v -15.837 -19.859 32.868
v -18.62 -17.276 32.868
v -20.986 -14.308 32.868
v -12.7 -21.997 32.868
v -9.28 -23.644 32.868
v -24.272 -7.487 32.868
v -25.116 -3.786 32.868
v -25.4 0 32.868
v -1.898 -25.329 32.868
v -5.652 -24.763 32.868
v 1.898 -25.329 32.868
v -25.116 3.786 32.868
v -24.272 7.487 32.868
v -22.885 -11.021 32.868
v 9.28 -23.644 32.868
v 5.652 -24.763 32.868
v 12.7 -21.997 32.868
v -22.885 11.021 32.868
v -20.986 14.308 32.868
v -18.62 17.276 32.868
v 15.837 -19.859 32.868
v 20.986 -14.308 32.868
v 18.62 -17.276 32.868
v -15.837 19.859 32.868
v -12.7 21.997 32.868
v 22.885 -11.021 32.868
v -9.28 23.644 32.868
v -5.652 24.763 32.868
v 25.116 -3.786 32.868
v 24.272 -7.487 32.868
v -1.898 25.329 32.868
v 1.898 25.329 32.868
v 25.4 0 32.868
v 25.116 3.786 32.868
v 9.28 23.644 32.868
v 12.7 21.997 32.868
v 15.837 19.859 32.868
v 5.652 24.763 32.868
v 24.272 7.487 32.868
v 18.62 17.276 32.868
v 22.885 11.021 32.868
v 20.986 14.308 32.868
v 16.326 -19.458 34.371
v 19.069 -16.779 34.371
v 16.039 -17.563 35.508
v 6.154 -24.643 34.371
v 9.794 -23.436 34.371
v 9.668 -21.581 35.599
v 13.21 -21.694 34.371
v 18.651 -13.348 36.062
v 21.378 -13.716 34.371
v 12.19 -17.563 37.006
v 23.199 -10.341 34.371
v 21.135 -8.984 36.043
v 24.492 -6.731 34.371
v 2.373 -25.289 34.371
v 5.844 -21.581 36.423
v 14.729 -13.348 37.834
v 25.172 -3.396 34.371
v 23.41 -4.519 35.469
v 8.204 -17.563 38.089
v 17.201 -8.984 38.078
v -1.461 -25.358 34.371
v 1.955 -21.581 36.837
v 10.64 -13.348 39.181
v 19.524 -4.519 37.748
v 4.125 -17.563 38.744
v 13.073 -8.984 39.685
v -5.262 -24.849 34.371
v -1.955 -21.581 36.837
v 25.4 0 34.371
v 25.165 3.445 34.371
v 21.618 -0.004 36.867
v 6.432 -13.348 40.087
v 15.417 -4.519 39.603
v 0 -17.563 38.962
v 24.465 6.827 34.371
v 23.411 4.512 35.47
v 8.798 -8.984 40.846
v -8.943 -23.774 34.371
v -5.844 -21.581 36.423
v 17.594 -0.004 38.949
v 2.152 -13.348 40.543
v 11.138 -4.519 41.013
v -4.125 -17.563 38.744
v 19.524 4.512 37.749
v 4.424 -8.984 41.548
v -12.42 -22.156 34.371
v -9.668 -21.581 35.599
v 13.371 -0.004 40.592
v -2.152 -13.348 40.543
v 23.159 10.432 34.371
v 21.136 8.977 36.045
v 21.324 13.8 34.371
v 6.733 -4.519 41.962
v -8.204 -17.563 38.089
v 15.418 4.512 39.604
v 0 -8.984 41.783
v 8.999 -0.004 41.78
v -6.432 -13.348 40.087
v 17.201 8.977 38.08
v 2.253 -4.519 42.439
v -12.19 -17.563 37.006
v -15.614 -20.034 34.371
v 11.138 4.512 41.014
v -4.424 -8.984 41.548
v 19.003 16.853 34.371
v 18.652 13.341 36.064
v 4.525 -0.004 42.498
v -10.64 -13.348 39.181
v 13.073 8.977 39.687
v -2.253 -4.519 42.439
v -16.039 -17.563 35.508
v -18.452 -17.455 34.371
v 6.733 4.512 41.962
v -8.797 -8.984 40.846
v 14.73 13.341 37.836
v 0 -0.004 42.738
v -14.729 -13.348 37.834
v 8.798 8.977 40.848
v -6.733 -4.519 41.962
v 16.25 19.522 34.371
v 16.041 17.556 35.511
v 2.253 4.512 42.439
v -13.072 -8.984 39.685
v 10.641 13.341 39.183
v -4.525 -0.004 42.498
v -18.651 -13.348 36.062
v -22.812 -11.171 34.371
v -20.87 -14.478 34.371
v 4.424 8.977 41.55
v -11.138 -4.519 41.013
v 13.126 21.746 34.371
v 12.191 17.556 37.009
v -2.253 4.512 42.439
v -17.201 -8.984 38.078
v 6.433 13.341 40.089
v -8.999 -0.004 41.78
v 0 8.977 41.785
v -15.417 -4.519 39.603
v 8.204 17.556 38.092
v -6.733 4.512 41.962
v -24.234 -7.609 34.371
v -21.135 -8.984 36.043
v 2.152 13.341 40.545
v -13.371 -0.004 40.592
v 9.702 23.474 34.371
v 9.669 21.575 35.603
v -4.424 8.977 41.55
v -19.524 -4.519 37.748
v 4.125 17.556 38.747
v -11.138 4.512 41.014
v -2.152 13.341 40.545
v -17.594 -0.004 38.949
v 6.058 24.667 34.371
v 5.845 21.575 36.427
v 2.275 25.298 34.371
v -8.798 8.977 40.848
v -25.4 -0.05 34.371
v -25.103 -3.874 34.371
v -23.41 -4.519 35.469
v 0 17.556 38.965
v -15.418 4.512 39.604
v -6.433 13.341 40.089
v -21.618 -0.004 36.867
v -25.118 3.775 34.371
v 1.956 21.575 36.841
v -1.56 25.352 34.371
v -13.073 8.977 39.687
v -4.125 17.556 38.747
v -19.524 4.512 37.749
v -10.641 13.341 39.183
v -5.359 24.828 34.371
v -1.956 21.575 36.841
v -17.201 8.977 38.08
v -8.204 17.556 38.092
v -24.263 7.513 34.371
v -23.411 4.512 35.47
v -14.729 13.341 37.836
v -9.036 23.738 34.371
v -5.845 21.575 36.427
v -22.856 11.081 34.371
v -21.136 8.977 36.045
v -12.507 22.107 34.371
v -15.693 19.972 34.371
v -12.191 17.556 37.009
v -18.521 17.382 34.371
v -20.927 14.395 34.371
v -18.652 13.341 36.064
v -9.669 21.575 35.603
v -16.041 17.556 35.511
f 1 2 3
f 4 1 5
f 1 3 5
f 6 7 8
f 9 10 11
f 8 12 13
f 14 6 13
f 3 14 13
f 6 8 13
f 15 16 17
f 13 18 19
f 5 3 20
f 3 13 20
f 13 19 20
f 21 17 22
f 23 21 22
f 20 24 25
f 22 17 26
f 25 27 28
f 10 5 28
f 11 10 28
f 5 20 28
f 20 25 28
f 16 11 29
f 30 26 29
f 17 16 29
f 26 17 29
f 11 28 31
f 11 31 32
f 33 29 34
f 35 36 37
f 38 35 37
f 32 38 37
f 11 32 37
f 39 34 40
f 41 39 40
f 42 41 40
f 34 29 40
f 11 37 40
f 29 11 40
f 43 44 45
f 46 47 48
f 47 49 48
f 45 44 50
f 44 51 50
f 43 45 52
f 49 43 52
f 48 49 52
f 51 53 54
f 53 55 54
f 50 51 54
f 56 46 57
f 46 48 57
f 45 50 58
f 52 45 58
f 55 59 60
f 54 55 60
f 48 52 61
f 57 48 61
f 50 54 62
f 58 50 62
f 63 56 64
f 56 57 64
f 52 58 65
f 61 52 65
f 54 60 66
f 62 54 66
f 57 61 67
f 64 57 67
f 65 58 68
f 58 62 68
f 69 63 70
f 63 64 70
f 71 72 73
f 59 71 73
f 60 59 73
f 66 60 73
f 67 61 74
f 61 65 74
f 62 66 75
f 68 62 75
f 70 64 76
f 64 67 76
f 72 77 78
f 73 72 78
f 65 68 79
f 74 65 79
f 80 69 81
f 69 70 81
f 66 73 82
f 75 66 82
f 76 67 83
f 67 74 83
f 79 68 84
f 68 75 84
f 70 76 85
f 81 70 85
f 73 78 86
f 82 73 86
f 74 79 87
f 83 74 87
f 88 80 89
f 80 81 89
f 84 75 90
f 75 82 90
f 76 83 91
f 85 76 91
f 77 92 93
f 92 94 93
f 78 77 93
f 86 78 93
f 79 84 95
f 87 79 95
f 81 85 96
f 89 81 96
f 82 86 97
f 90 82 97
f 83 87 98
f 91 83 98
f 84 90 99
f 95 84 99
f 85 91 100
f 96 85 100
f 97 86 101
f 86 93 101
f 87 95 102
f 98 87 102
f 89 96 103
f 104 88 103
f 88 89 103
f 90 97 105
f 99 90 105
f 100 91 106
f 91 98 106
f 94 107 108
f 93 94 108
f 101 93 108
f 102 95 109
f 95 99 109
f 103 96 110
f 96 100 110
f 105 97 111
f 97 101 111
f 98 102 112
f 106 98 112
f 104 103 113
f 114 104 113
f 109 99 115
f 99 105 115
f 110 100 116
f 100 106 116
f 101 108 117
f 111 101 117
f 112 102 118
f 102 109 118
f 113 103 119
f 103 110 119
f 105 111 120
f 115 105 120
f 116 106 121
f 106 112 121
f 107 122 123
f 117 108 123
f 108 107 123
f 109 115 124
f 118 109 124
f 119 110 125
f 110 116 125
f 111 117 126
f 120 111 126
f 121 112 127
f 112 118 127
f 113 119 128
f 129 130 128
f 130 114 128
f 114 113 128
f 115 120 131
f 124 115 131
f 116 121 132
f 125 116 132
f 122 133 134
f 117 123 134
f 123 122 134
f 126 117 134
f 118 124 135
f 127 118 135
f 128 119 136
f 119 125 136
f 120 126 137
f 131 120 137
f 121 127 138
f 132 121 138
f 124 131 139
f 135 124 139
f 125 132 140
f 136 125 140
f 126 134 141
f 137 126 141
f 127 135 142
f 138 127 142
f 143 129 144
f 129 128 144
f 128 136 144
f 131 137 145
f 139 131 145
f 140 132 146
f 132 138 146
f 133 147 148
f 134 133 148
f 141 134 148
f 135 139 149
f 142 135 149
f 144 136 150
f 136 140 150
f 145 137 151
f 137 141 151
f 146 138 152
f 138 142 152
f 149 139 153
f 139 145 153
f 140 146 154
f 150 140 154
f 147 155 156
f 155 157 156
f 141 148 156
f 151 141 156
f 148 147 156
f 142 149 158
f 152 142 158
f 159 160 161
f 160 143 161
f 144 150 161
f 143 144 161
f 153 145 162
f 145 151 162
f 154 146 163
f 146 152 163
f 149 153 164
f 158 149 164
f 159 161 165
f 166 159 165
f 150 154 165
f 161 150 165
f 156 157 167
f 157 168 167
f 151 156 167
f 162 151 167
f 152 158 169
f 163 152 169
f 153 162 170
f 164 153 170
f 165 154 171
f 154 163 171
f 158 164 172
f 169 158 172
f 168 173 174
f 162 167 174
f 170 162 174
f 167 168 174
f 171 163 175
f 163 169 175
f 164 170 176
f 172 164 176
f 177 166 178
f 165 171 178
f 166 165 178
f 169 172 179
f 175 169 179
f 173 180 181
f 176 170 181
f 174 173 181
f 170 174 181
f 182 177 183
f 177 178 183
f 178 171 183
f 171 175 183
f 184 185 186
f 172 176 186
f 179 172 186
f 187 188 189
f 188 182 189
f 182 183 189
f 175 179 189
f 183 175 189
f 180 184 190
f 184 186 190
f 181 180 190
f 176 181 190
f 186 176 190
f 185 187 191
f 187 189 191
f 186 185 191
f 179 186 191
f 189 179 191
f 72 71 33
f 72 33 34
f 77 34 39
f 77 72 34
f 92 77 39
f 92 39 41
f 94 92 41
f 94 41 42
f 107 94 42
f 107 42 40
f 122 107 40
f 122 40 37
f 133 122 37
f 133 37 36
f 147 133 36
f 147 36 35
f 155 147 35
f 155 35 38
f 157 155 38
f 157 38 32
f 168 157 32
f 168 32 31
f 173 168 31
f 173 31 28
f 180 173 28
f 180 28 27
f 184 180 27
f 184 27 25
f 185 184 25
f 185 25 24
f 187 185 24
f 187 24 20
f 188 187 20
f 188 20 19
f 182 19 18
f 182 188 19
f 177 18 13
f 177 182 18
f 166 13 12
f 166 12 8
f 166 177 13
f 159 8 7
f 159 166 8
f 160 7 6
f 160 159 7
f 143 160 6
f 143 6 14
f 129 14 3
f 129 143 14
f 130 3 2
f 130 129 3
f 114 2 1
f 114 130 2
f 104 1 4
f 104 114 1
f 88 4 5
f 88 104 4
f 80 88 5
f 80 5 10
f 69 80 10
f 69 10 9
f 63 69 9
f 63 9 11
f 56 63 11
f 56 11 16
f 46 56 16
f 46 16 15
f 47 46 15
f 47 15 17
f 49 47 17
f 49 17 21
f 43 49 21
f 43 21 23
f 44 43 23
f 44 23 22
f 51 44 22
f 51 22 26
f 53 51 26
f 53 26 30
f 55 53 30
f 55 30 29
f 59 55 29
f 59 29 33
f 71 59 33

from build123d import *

# Parameters (mm, degrees)
SKETCH2_OUTSIDE_W  = 117.086
SKETCH2_OUTSIDE_H  = 117.086
SKETCH2_OUTSIDE_R  = 25.4
CUT_EXTRUDE1_DEPTH = 86.476
SKETCH3_R          = 25.4
CUT_EXTRUDE2_DEPTH = 76.606


with BuildPart() as part:
    # Sketch1 → Revolve1 (revolve)
    with BuildSketch(Plane.XY):
        with BuildLine():
            Line((0, 42.738), (0, -42.738))
            ThreePointArc((0, -42.738), (-42.738, 0), (0, 42.738))
        make_face()
    revolve(axis=Axis((0, 42.738, 0), (0, -1, 0)))

    # Sketch2 outside → Cut-Extrude1 (cut, through all)
    with BuildSketch(Plane.XY.offset(42.738)):
        Rectangle(SKETCH2_OUTSIDE_W, SKETCH2_OUTSIDE_H)
        Circle(SKETCH2_OUTSIDE_R, mode=Mode.SUBTRACT)
    extrude(amount=-CUT_EXTRUDE1_DEPTH, mode=Mode.SUBTRACT)

    # Sketch3 → Cut-Extrude2 (cut, through all)
    with BuildSketch(Plane.XY.offset(32.868)):
        Circle(SKETCH3_R)
    extrude(amount=-CUT_EXTRUDE2_DEPTH, mode=Mode.SUBTRACT)


solid = part.part
